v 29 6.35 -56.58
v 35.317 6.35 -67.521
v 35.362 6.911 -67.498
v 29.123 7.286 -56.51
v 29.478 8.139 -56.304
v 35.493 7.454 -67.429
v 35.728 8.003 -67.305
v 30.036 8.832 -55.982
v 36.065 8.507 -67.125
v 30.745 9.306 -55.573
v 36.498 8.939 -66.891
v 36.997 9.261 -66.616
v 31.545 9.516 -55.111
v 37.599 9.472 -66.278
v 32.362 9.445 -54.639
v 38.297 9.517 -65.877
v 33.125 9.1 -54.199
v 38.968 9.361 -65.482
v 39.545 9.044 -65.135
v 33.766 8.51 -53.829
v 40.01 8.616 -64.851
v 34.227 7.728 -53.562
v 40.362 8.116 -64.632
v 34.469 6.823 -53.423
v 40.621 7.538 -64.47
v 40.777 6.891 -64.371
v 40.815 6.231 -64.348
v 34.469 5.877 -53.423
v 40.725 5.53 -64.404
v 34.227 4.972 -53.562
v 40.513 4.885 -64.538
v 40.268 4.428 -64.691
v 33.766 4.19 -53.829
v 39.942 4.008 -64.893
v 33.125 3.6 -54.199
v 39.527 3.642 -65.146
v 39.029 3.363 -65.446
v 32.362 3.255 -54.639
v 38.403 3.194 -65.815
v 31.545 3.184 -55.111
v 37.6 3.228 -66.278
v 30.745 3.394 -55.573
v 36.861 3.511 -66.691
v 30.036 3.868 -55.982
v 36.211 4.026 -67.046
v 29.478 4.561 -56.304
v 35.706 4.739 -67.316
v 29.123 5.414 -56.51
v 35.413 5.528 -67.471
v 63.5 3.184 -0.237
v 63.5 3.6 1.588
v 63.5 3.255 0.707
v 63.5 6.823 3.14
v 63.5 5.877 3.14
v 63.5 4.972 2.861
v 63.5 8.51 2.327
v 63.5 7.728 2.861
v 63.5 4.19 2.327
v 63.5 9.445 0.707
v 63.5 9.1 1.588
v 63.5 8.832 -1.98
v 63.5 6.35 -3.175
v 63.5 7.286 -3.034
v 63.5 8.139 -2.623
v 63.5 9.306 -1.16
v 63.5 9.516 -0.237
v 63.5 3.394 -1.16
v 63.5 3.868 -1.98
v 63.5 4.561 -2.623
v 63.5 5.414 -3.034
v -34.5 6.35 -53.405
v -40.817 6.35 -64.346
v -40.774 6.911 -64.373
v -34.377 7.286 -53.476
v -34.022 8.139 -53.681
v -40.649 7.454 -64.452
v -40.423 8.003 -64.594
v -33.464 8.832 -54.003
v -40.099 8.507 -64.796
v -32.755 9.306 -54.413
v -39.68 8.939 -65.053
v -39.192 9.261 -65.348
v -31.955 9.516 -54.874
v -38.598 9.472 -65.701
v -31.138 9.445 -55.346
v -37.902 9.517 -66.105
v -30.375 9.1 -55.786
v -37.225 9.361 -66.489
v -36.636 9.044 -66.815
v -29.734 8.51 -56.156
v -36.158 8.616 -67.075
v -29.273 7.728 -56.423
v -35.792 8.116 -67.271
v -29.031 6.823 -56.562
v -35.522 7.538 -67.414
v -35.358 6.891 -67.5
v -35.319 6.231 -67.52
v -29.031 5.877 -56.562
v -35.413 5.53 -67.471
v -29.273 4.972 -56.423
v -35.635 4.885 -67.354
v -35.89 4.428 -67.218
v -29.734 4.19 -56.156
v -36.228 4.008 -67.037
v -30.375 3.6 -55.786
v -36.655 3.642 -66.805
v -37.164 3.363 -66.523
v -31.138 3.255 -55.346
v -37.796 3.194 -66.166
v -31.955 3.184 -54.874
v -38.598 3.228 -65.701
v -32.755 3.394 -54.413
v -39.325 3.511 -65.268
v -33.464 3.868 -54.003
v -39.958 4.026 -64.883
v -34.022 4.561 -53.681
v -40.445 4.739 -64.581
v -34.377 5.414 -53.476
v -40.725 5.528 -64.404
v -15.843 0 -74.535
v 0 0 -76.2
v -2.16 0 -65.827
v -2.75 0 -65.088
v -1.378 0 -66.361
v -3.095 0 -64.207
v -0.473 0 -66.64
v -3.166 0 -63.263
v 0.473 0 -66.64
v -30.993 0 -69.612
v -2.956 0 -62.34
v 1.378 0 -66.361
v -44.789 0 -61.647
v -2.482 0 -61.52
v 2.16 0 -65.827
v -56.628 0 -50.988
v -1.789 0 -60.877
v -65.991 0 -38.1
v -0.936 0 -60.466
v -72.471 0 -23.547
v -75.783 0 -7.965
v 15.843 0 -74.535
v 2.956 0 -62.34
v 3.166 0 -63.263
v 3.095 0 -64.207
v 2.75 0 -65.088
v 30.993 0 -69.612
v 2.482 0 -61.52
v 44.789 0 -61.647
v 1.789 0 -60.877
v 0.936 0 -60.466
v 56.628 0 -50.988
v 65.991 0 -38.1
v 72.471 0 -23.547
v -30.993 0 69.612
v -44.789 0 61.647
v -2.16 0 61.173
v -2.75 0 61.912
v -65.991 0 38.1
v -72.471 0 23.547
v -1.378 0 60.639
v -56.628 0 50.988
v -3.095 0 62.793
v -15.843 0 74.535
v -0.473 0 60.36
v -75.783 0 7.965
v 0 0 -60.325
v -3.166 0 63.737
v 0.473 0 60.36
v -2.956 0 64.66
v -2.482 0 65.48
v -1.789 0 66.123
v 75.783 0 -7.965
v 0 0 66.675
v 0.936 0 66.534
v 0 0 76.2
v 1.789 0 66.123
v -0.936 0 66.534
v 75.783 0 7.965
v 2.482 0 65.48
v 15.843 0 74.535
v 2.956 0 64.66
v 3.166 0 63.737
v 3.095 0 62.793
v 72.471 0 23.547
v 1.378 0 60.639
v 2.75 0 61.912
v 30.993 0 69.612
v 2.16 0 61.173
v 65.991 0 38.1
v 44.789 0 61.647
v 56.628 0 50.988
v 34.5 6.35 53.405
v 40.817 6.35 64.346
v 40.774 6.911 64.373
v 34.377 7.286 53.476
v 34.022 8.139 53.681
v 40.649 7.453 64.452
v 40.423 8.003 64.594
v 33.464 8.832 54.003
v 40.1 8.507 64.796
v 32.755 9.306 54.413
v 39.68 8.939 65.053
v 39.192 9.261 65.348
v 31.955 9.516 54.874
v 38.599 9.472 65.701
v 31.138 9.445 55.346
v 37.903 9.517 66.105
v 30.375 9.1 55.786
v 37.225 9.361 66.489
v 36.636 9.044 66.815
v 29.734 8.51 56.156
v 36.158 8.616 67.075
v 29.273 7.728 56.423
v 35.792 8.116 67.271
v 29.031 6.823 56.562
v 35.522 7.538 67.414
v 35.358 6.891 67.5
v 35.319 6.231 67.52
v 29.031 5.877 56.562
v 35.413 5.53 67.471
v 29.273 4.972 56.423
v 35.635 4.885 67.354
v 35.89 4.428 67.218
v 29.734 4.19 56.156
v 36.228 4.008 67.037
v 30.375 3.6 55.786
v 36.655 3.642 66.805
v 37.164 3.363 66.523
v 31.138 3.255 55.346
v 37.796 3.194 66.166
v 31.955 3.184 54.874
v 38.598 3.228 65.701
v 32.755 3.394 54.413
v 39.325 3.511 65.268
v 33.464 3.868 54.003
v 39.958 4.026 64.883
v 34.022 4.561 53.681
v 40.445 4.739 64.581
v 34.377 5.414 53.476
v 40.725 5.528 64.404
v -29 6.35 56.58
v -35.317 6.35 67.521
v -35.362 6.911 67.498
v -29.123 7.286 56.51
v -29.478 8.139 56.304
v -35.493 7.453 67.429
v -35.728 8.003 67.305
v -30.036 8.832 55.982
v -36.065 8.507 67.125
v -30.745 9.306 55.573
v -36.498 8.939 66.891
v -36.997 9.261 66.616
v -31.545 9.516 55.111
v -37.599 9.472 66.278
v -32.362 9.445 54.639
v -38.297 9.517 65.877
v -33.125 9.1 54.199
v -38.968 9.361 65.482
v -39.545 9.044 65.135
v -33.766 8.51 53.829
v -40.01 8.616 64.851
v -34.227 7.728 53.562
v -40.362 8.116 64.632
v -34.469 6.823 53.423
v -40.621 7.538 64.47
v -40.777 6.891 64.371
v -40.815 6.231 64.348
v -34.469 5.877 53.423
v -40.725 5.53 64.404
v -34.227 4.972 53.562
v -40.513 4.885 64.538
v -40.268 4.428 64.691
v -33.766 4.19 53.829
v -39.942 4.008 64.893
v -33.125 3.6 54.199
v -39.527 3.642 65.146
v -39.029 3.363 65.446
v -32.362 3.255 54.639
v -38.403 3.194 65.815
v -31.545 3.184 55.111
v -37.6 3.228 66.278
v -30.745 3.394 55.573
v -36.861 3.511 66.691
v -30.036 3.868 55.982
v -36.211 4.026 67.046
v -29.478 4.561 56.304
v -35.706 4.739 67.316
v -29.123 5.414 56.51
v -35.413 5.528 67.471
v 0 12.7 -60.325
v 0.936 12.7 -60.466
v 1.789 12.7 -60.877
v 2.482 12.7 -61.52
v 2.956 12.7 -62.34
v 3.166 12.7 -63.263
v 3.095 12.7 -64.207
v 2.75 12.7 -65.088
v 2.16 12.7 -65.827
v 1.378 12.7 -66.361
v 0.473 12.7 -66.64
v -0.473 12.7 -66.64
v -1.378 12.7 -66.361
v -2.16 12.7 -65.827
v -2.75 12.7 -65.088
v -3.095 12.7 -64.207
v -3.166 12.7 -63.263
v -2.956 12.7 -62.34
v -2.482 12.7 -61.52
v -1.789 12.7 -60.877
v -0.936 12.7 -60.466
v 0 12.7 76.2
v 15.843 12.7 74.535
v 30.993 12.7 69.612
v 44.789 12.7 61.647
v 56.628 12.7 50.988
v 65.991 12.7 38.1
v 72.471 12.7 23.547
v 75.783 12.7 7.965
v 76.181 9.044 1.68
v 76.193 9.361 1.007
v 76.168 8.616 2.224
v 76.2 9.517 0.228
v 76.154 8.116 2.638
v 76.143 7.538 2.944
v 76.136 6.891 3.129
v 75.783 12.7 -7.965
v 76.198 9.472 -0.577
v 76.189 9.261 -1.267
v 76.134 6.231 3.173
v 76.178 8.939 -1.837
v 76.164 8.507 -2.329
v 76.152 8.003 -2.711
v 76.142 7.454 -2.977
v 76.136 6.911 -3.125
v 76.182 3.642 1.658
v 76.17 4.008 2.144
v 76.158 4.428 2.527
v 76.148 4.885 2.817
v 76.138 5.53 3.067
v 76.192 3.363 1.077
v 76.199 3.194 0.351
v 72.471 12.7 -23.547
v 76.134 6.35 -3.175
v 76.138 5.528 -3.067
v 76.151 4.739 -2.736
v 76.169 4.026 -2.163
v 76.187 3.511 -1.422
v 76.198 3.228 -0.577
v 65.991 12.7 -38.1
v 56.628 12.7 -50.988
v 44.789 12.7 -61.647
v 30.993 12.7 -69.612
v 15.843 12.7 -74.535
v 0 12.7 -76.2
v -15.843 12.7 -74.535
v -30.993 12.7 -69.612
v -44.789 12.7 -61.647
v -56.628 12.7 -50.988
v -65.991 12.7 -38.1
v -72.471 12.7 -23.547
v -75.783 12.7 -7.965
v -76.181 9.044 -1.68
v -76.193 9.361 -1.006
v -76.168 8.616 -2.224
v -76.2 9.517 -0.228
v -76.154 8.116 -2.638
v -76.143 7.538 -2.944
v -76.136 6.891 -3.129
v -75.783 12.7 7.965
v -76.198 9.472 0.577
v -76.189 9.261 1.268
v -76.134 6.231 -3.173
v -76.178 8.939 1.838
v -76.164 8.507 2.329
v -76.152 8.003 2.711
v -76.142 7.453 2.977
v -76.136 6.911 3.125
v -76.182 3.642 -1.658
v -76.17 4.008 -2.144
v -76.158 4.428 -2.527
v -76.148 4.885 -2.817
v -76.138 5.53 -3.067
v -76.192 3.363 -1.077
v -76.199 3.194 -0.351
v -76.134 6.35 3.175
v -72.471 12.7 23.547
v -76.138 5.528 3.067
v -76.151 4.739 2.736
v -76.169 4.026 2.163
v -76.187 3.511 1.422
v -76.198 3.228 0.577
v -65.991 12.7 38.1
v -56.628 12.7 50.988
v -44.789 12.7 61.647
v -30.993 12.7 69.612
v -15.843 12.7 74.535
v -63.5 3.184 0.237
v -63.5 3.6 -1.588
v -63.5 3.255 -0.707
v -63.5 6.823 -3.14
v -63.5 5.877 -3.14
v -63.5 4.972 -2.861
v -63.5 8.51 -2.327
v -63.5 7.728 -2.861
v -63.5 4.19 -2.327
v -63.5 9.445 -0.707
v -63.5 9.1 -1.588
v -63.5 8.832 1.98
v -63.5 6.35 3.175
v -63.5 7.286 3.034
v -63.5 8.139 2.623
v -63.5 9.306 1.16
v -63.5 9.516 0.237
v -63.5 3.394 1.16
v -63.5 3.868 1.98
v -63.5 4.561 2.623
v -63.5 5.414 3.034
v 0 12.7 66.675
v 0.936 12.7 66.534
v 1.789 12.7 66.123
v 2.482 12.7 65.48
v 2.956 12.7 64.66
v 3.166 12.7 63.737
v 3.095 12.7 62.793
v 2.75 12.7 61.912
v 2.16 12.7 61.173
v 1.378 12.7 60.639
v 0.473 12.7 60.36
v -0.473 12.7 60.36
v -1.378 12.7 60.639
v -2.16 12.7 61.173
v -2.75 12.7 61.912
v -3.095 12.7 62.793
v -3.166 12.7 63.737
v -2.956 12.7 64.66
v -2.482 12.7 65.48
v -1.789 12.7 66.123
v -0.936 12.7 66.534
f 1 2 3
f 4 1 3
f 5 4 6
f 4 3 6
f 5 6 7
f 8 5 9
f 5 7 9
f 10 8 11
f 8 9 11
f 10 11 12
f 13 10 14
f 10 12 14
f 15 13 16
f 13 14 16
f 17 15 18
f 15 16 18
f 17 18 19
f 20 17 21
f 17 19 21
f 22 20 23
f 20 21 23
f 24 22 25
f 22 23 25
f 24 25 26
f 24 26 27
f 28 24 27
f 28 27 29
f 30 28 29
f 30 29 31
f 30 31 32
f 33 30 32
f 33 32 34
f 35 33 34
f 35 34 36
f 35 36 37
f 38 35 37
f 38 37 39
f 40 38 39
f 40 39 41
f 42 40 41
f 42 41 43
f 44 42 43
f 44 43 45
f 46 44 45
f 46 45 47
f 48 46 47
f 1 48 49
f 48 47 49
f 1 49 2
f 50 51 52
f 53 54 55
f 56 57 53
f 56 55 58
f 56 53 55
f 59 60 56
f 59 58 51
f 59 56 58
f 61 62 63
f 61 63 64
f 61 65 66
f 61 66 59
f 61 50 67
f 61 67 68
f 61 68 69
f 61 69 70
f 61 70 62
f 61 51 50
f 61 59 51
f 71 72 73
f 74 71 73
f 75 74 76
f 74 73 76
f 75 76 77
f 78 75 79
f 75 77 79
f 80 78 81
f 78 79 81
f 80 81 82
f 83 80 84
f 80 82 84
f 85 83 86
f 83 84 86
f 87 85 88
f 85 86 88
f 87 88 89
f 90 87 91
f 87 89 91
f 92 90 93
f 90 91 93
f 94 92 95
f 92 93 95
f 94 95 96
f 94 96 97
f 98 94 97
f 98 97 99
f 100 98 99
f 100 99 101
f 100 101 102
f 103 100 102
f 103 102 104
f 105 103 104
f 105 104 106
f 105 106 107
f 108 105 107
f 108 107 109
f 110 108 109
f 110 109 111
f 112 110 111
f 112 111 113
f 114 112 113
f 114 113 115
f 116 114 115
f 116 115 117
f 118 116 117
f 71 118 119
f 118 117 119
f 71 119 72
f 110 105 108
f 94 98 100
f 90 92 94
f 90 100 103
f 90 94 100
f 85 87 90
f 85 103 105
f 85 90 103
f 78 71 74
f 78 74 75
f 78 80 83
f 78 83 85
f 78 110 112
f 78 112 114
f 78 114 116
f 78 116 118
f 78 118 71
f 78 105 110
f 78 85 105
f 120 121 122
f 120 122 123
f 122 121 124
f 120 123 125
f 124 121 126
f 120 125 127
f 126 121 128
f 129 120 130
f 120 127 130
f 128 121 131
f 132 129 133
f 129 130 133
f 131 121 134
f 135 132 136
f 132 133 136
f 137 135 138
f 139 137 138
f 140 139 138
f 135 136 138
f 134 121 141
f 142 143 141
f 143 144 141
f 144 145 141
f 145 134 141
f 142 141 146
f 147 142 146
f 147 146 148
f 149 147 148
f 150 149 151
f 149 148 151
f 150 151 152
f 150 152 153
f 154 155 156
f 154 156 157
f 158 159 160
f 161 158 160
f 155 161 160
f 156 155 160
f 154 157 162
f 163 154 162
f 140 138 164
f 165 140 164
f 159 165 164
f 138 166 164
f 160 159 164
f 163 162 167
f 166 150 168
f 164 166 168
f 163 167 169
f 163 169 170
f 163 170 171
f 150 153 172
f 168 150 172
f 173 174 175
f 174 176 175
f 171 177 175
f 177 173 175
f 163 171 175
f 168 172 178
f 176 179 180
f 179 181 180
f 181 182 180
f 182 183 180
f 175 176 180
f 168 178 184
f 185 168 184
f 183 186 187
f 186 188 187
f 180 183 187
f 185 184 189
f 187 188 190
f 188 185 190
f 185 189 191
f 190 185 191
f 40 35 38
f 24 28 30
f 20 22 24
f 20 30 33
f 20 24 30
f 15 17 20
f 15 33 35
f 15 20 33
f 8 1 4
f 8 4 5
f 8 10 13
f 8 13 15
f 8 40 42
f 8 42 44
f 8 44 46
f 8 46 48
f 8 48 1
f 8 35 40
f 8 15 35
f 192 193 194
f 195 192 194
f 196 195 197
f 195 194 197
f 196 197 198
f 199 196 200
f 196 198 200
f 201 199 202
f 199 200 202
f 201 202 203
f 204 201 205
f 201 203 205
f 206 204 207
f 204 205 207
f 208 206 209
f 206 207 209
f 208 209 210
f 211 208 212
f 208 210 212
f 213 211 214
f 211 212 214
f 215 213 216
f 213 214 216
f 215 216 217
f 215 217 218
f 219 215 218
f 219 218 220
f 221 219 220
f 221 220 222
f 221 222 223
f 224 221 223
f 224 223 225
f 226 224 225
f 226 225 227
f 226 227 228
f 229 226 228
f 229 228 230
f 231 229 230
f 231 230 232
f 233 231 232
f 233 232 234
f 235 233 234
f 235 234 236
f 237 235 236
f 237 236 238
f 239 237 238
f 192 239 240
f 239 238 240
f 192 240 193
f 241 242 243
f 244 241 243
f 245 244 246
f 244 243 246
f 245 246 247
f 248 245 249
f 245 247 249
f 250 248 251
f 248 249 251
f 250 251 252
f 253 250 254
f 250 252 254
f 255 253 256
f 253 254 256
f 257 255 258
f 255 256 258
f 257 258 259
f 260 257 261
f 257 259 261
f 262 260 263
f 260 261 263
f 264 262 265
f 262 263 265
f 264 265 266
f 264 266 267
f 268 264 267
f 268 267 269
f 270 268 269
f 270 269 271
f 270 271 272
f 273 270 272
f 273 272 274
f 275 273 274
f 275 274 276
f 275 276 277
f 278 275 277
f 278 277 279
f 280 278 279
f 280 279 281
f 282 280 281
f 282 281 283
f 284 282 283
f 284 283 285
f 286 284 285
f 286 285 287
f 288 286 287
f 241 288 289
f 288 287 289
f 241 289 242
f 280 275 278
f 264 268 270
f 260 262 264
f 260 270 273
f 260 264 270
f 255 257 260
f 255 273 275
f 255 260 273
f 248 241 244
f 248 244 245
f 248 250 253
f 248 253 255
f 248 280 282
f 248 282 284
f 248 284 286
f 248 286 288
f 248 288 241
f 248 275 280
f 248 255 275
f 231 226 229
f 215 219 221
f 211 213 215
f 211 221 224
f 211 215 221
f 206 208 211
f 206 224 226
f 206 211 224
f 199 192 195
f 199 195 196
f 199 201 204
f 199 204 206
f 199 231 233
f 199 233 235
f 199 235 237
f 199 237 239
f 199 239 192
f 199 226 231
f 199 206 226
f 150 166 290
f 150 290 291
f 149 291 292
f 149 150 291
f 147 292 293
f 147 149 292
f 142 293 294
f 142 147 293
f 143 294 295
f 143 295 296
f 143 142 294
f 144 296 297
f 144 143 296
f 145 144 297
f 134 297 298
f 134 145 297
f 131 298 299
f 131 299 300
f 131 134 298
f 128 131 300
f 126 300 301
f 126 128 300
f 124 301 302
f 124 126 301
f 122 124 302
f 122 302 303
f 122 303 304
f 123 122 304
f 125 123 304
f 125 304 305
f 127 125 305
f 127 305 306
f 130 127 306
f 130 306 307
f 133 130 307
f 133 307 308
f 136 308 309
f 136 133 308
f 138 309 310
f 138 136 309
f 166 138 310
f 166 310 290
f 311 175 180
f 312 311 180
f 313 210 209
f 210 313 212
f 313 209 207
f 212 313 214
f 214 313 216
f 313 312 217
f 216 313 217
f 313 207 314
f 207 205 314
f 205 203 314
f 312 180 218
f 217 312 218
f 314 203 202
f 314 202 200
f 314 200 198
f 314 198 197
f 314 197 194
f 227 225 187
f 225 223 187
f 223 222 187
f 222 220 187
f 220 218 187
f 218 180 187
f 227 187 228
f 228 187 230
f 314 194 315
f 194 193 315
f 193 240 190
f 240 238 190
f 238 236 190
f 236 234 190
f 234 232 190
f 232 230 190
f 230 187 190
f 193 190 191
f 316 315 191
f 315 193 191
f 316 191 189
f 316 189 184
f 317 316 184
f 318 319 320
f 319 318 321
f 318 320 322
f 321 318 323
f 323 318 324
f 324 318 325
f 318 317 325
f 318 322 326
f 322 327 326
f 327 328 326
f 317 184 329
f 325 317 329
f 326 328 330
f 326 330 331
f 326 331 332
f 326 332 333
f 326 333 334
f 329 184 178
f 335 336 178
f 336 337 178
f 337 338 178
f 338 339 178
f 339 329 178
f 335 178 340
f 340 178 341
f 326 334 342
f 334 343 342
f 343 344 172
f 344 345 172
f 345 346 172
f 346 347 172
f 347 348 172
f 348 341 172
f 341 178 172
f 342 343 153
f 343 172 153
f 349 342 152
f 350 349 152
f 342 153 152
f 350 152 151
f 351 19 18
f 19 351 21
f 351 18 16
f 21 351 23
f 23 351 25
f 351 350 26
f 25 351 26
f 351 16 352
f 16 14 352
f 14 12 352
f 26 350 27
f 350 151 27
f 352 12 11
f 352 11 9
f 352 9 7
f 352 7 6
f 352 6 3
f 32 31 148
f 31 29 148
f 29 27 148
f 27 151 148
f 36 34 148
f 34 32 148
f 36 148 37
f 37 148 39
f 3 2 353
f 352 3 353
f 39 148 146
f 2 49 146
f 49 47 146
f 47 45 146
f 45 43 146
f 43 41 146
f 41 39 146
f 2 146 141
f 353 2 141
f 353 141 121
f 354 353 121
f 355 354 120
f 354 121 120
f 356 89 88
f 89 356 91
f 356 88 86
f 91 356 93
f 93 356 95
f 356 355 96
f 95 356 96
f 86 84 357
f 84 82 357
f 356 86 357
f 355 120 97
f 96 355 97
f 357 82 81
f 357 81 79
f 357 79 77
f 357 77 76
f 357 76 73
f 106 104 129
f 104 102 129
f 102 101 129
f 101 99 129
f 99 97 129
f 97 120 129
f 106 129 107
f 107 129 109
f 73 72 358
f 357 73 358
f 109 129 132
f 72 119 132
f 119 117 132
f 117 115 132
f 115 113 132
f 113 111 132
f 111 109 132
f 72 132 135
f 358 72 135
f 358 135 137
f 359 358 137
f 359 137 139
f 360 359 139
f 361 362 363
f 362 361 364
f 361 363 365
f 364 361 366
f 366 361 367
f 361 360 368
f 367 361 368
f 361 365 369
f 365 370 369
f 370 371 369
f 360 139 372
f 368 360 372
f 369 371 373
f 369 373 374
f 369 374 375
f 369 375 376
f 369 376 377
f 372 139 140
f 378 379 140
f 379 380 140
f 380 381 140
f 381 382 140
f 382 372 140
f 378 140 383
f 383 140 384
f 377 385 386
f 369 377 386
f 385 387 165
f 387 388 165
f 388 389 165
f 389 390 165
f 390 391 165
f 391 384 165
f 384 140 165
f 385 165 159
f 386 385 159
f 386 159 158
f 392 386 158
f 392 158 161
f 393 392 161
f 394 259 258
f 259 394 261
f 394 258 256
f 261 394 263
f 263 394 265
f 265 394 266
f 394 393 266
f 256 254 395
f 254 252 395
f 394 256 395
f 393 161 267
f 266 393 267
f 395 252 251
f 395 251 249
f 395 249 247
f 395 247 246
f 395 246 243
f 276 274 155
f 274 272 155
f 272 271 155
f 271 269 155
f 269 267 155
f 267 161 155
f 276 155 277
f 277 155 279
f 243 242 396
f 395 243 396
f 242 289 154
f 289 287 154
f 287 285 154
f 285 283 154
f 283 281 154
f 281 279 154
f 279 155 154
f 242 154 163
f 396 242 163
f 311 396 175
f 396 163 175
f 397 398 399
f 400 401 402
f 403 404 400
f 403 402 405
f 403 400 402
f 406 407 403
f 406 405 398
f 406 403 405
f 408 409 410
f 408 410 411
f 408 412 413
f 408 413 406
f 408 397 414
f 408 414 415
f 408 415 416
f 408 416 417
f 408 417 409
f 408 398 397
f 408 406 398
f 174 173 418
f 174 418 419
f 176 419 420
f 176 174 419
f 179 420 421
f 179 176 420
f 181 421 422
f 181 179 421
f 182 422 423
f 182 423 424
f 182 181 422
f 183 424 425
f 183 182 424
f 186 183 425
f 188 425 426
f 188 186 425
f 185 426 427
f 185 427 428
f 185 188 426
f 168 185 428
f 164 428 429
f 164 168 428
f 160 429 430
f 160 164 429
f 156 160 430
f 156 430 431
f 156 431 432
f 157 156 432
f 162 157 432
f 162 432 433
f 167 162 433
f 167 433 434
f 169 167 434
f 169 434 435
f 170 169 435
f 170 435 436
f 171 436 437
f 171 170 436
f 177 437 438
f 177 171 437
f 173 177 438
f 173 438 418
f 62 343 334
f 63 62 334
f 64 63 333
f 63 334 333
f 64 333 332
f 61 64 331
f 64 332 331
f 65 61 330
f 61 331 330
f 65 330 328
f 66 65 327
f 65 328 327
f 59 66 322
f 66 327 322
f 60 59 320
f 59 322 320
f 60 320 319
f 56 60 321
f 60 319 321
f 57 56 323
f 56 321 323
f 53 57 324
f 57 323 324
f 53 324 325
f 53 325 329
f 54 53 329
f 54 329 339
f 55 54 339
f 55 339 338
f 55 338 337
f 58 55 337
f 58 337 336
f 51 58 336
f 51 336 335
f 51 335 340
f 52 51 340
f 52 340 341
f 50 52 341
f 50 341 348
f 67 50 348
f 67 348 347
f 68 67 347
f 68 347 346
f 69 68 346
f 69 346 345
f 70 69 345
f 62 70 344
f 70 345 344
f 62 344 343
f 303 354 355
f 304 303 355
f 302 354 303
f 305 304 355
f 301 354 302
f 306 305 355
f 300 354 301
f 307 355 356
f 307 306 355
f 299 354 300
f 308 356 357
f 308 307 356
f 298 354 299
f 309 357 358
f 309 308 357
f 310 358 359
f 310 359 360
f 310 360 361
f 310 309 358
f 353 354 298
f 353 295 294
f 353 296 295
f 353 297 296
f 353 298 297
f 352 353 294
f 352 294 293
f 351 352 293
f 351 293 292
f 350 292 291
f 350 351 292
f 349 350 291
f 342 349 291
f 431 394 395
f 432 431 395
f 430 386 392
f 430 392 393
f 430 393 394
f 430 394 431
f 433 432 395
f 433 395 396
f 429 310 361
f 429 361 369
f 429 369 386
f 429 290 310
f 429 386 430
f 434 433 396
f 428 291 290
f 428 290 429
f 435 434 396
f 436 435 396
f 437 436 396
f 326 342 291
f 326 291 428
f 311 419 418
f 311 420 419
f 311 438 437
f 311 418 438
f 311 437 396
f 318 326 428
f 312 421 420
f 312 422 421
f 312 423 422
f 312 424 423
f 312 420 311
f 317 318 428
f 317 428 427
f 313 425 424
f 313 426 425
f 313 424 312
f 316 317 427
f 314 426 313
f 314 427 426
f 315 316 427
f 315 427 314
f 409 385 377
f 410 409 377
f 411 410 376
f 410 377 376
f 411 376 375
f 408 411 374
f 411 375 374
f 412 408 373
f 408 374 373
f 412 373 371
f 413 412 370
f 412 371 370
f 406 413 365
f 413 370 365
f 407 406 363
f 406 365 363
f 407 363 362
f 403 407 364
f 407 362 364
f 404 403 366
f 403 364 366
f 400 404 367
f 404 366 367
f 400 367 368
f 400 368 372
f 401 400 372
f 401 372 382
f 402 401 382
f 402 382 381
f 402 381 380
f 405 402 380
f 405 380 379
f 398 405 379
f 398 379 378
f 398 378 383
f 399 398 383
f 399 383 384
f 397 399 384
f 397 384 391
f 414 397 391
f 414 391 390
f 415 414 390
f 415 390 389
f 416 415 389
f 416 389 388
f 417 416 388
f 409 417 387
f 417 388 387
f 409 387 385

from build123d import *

# Parameters (mm, degrees)
SKETCH1_R           = 76.2
SKETCH1_R_2         = 3.175
BOSS_EXTRUDE1_DEPTH = 12.7
SKETCH2_R           = 3.175
CUT_EXTRUDE1_DEPTH  = 12.7
CIRPATTERN1_COUNT   = 6


with BuildPart() as part:
    # Sketch1 → Boss-Extrude1 (new body)
    with BuildSketch(Plane(origin=(0, 0, 0), x_dir=(1, 0, 0), z_dir=(0, 1, 0))):
        with Locations(Location((0, 0, 0), (0, 0, 270))):
            Circle(SKETCH1_R)
        with Locations(Location((0, -63.5, 0), (0, 0, 270))):
            Circle(SKETCH1_R_2, mode=Mode.SUBTRACT)
        with Locations(Location((0, 63.5, 0), (0, 0, 270))):
            Circle(SKETCH1_R_2, mode=Mode.SUBTRACT)
    extrude(amount=BOSS_EXTRUDE1_DEPTH)

    # Sketch2 → Cut-Extrude1 (cut)
    with BuildSketch(Plane(origin=(76.2, 0, 0), x_dir=(0, 0, -1), z_dir=(1, 0, 0))):
        with Locations((0, 6.35)):
            Circle(SKETCH2_R)
    cut_extrude1 = extrude(amount=-CUT_EXTRUDE1_DEPTH, mode=Mode.SUBTRACT)

    # CirPattern1: Cut-Extrude1 ×6 about axis
    cirpattern1_axis = Axis((0, 0, 0), (0, 1, 0))
    for i in range(1, CIRPATTERN1_COUNT):
        add(cut_extrude1.rotate(cirpattern1_axis, i * 360 / CIRPATTERN1_COUNT), mode=Mode.SUBTRACT)


solid = part.part
